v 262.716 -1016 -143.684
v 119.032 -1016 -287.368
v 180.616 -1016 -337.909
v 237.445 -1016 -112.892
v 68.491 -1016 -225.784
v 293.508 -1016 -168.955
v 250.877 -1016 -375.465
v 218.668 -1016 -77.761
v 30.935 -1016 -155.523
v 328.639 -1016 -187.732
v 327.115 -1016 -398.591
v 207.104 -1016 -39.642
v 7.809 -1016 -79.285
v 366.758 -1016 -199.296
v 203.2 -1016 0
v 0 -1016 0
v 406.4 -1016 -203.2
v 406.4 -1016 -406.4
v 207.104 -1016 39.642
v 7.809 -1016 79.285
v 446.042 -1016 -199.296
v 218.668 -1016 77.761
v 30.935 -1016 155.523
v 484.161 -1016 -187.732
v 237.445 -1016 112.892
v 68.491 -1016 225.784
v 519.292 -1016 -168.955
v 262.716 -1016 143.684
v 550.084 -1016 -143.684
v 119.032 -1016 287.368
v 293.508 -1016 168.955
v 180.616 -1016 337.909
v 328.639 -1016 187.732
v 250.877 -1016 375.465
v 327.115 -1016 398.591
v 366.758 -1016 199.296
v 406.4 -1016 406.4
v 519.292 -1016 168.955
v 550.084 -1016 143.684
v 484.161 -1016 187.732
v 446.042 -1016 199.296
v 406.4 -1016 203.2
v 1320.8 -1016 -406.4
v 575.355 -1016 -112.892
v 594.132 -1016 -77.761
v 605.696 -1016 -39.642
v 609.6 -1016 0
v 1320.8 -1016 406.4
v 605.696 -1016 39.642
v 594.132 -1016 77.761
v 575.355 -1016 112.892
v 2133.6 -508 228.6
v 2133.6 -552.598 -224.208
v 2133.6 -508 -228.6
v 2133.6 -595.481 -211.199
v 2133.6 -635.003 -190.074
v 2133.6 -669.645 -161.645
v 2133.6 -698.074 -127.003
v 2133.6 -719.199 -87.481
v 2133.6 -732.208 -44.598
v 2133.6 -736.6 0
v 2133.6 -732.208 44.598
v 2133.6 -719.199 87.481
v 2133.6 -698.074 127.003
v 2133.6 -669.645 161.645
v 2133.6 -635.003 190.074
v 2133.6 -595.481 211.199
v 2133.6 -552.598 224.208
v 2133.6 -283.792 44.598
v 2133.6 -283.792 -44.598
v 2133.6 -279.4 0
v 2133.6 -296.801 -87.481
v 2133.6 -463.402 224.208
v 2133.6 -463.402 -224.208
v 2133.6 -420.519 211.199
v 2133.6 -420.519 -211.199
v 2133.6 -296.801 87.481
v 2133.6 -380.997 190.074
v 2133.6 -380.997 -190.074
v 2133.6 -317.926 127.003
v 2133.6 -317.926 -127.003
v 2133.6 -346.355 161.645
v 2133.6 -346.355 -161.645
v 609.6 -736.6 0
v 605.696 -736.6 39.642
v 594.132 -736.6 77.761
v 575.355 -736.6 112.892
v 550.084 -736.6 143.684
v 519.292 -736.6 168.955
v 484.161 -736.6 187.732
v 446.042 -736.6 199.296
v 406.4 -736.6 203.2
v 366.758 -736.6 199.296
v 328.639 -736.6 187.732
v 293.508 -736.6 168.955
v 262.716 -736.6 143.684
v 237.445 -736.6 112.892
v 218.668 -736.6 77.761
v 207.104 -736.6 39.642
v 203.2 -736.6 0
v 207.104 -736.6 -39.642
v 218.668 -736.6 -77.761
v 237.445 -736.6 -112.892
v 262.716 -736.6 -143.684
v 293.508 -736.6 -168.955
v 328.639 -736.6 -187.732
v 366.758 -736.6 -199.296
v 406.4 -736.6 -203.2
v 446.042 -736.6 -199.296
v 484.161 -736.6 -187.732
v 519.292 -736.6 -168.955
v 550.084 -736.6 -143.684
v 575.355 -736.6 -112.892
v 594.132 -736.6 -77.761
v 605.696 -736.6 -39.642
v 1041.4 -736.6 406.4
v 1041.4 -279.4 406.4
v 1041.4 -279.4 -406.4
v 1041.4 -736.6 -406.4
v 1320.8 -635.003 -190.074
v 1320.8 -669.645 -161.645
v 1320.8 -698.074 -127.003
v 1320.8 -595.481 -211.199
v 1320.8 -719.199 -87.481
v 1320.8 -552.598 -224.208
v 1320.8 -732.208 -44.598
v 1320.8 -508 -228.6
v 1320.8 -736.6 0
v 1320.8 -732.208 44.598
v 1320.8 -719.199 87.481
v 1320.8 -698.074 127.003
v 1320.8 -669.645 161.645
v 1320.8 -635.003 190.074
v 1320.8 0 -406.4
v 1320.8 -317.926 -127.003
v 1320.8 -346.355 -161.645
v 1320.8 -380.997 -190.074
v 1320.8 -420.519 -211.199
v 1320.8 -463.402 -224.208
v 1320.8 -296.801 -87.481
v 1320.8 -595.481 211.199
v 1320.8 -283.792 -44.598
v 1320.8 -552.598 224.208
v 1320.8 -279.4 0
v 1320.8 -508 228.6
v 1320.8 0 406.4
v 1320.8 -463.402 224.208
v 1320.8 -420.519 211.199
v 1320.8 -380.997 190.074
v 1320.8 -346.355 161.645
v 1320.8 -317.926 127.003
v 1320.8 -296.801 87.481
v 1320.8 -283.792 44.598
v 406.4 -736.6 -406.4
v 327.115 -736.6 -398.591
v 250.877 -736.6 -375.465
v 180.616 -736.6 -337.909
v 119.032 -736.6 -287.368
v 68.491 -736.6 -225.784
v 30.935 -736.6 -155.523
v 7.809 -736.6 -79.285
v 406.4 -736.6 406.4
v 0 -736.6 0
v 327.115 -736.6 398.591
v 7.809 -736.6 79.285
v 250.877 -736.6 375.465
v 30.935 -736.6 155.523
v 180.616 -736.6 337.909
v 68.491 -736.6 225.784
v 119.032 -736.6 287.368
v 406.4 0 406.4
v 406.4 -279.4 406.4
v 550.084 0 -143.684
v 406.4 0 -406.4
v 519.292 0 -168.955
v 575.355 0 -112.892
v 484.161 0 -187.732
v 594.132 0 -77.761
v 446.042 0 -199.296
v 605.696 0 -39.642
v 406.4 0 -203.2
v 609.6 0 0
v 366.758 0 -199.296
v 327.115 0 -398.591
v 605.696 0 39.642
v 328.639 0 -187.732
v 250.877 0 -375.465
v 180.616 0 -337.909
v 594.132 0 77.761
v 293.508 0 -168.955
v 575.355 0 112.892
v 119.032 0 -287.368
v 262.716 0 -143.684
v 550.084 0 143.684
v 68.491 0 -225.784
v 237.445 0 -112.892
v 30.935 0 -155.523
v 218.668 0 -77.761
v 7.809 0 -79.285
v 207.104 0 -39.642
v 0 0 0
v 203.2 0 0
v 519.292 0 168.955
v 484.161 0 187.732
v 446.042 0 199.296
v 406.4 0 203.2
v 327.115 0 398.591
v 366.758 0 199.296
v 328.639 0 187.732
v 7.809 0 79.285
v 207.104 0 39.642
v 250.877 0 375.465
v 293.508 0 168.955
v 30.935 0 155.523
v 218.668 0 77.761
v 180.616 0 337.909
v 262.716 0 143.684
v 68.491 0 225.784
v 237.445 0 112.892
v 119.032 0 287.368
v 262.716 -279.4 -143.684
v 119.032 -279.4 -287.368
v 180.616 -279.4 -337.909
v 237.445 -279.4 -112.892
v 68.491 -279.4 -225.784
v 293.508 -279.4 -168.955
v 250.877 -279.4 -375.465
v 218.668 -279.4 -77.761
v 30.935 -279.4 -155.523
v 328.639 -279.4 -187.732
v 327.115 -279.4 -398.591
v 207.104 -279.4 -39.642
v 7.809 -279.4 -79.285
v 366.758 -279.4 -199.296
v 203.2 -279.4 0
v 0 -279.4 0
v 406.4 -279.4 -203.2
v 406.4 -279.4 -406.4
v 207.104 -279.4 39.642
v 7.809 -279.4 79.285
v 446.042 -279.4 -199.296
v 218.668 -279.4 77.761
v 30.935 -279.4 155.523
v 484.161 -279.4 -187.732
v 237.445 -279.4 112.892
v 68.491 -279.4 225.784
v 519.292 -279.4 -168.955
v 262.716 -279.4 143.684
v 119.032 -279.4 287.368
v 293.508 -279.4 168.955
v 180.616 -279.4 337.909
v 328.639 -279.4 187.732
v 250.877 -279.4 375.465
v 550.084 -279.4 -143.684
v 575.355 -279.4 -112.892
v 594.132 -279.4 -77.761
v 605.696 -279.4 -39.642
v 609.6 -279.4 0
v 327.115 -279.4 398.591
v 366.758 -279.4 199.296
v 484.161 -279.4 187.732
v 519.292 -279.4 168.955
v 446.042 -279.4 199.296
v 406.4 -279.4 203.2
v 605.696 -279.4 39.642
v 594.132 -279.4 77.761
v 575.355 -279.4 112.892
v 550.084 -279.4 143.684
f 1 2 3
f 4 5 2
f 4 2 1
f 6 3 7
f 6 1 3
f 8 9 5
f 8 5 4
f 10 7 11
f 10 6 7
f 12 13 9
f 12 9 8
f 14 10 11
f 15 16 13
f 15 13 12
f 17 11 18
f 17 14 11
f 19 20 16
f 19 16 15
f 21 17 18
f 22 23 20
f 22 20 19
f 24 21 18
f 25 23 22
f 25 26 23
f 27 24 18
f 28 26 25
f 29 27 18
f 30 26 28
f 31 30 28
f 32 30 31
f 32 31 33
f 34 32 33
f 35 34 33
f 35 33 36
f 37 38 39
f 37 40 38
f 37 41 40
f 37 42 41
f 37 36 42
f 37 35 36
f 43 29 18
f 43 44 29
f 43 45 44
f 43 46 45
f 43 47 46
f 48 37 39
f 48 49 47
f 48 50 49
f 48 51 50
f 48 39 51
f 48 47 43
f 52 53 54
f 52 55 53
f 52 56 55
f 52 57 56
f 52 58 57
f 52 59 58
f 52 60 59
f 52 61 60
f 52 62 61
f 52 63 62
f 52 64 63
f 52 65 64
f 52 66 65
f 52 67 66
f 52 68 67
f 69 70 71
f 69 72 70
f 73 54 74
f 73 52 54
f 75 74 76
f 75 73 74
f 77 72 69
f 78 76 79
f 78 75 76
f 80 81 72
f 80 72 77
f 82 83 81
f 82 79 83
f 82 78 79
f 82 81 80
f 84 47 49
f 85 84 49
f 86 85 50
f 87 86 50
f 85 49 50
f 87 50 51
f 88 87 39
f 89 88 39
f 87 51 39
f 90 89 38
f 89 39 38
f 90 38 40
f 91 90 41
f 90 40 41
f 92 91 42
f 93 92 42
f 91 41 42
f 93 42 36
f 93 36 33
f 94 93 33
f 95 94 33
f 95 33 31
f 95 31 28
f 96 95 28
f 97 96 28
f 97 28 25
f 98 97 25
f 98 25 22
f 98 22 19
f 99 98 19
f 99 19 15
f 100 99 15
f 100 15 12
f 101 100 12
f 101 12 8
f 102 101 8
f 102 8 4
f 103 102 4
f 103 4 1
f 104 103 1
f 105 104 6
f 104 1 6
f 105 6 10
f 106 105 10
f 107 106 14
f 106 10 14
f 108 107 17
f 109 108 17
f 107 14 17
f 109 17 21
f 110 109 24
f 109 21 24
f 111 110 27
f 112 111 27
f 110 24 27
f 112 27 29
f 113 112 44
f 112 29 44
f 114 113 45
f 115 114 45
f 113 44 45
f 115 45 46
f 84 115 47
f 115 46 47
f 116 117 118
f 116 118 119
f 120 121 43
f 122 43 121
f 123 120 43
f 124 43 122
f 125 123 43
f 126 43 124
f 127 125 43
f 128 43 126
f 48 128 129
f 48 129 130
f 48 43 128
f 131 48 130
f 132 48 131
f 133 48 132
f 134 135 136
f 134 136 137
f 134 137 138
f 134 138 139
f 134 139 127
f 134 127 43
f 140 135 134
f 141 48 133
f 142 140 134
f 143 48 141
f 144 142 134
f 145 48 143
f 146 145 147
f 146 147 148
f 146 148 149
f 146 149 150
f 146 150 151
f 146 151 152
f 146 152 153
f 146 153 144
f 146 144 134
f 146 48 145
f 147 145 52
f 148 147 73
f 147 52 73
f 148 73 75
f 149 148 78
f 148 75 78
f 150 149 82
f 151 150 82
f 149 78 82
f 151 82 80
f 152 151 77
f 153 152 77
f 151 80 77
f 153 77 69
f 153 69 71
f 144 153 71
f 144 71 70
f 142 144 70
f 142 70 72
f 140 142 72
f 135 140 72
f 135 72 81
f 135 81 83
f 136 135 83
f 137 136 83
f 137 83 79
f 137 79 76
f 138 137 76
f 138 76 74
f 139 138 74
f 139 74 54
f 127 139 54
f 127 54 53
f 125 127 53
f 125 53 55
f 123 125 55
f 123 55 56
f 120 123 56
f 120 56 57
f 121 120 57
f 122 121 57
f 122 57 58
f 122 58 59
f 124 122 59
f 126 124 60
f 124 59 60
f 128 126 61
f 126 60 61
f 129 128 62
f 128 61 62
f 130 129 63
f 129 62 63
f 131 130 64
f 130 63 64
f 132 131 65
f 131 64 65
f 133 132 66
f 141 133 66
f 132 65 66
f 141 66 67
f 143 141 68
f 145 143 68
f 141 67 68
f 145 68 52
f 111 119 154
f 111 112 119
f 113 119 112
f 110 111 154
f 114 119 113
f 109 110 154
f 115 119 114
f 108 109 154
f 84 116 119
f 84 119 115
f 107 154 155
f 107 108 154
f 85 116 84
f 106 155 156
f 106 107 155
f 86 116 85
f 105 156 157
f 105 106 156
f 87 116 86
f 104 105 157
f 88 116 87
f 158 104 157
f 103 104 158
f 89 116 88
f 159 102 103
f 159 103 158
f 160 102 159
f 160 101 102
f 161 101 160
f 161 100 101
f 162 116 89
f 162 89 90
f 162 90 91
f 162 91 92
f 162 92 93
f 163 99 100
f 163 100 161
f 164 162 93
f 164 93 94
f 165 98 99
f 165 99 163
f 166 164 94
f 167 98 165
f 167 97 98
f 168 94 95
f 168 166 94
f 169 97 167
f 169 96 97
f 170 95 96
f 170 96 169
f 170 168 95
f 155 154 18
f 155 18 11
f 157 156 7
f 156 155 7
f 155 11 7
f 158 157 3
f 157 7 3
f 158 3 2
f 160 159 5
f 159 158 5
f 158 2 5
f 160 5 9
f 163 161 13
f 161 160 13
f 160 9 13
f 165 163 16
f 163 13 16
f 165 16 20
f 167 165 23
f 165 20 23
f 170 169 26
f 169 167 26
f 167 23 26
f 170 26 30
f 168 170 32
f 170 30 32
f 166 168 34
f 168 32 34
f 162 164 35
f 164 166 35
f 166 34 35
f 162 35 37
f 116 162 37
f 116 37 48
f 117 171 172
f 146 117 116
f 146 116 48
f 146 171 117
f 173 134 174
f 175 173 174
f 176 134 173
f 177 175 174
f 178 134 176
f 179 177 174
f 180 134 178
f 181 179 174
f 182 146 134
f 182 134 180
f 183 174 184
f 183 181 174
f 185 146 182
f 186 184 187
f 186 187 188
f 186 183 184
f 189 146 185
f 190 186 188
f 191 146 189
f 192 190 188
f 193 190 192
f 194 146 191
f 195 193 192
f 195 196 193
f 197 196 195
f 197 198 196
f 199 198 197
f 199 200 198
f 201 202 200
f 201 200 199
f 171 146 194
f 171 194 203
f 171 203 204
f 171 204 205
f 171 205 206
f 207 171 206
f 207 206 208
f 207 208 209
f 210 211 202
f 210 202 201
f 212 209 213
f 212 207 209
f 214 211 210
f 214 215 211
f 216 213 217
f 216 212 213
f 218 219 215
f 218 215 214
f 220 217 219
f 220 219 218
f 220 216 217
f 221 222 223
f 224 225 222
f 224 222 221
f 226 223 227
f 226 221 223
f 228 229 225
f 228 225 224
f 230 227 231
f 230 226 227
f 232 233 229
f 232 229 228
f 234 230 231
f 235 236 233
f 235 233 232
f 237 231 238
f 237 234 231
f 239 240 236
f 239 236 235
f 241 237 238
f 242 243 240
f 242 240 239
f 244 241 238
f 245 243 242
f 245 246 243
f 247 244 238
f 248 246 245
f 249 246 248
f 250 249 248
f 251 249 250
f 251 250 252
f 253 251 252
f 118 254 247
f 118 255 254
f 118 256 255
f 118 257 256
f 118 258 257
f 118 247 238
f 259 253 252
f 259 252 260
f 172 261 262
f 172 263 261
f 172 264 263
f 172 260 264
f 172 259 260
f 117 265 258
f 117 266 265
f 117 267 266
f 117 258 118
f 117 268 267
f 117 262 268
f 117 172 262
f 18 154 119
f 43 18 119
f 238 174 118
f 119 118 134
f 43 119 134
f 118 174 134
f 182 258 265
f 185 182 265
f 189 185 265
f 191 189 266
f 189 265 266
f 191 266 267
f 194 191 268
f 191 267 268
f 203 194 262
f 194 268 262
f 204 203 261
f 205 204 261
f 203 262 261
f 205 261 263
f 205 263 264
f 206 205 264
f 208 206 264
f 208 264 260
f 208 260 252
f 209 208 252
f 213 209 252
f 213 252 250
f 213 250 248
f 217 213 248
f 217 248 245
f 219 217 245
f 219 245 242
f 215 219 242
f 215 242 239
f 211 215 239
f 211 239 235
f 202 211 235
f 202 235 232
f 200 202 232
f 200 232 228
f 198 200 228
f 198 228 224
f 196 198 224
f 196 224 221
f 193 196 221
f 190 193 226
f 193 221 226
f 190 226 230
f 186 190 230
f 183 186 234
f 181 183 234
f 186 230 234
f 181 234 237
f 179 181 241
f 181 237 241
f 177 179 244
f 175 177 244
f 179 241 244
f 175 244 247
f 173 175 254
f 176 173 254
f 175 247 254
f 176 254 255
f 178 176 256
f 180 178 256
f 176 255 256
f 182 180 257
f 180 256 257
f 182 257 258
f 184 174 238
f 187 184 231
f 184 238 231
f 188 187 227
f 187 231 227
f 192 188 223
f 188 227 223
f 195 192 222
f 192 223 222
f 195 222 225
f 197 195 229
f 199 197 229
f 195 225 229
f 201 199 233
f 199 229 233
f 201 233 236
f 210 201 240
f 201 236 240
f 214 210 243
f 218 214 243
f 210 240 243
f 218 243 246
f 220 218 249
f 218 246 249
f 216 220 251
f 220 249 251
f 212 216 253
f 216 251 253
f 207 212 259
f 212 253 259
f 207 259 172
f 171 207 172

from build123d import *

# Parameters (mm, degrees)
F1_DEPTH  = 406.4
F2_DEPTH  = 406.4
F0_W      = 812.8
F0_H      = 457.2
F3_DEPTH  = 228.6
F4_DEPTH  = 228.6
F5_R      = 203.2
F6_DEPTH  = 1270
F8_DEPTH  = 1270
F10_DEPTH = 812.8


with BuildPart() as f1:
    # F0 (on Top) → F1 (new body)
    with BuildSketch(Plane.XY):
        Polygon((1320.8, 0), (0, 0), (0, -279.4), (1041.4, -279.4), (1041.4, -736.6), (0, -736.6), (0, -1016), (1320.8, -1016), (1320.8, -736.6), (1320.8, -279.4), align=None)
    extrude(amount=F1_DEPTH)

    # F0 (on Top) → F2 (join)
    with BuildSketch(Plane.XY):
        Polygon((1320.8, 0), (0, 0), (0, -279.4), (1041.4, -279.4), (1041.4, -736.6), (0, -736.6), (0, -1016), (1320.8, -1016), (1320.8, -736.6), (1320.8, -279.4), align=None)
    extrude(amount=-F2_DEPTH)

    # F0 (on Top) → F3 (join)
    with BuildSketch(Plane.XY):
        with Locations((1727.2, -508)):
            Rectangle(F0_W, F0_H)
    extrude(amount=F3_DEPTH)

    # F0 (on Top) → F4 (join)
    with BuildSketch(Plane.XY):
        with Locations((1727.2, -508)):
            Rectangle(F0_W, F0_H)
    extrude(amount=-F4_DEPTH)

    # F5 (on face) → F6 (cut)
    with BuildSketch(Plane.XZ.offset(1016)):
        with Locations((406.4, 0)):
            Circle(F5_R)
    extrude(amount=-F6_DEPTH, mode=Mode.SUBTRACT)

    # F7 (on face) → F8 (cut)
    with BuildSketch(Plane.XZ.offset(1016)):
        with BuildLine():
            ThreePointArc((0, -2.103e-07), (119.0318040514, 287.3681957999), (406.4, 406.4))
            Line((406.4, 406.4), (0, 406.4))
            Line((0, 406.4), (0, -2.103e-07))
        make_face()
        with BuildLine():
            Line((0, -406.4), (406.4, -406.4))
            ThreePointArc((406.4, -406.4), (119.0318042001, -287.3681959486), (0, -2.103e-07))
            Line((0, -2.103e-07), (0, -406.4))
        make_face()
    extrude(amount=-F8_DEPTH, mode=Mode.SUBTRACT)

    # F9 (on face) → F10 (cut)
    with BuildSketch(Plane.YZ.offset(2133.6)):
        with BuildLine():
            ThreePointArc((-736.6, -8.745e-07), (-669.6446104884, 161.6446098701), (-508, 228.6))
            Line((-508, 228.6), (-736.6, 228.6))
            Line((-736.6, 228.6), (-736.6, -8.745e-07))
        make_face()
        with BuildLine():
            ThreePointArc((-508, 228.6), (-346.3553898208, 161.6446101792), (-279.4, 0))
            Line((-279.4, 0), (-279.4, 228.6))
            Line((-279.4, 228.6), (-508, 228.6))
        make_face()
        with BuildLine():
            Line((-279.4, -228.6), (-279.4, 0))
            ThreePointArc((-279.4, 0), (-346.3553898208, -161.6446101792), (-508, -228.6))
            Line((-508, -228.6), (-279.4, -228.6))
        make_face()
        with BuildLine():
            Line((-736.6, -228.6), (-508, -228.6))
            ThreePointArc((-508, -228.6), (-669.6446098701, -161.6446104884), (-736.6, -8.745e-07))
            Line((-736.6, -8.745e-07), (-736.6, -228.6))
        make_face()
    extrude(amount=-F10_DEPTH, mode=Mode.SUBTRACT)


solid = f1.part
